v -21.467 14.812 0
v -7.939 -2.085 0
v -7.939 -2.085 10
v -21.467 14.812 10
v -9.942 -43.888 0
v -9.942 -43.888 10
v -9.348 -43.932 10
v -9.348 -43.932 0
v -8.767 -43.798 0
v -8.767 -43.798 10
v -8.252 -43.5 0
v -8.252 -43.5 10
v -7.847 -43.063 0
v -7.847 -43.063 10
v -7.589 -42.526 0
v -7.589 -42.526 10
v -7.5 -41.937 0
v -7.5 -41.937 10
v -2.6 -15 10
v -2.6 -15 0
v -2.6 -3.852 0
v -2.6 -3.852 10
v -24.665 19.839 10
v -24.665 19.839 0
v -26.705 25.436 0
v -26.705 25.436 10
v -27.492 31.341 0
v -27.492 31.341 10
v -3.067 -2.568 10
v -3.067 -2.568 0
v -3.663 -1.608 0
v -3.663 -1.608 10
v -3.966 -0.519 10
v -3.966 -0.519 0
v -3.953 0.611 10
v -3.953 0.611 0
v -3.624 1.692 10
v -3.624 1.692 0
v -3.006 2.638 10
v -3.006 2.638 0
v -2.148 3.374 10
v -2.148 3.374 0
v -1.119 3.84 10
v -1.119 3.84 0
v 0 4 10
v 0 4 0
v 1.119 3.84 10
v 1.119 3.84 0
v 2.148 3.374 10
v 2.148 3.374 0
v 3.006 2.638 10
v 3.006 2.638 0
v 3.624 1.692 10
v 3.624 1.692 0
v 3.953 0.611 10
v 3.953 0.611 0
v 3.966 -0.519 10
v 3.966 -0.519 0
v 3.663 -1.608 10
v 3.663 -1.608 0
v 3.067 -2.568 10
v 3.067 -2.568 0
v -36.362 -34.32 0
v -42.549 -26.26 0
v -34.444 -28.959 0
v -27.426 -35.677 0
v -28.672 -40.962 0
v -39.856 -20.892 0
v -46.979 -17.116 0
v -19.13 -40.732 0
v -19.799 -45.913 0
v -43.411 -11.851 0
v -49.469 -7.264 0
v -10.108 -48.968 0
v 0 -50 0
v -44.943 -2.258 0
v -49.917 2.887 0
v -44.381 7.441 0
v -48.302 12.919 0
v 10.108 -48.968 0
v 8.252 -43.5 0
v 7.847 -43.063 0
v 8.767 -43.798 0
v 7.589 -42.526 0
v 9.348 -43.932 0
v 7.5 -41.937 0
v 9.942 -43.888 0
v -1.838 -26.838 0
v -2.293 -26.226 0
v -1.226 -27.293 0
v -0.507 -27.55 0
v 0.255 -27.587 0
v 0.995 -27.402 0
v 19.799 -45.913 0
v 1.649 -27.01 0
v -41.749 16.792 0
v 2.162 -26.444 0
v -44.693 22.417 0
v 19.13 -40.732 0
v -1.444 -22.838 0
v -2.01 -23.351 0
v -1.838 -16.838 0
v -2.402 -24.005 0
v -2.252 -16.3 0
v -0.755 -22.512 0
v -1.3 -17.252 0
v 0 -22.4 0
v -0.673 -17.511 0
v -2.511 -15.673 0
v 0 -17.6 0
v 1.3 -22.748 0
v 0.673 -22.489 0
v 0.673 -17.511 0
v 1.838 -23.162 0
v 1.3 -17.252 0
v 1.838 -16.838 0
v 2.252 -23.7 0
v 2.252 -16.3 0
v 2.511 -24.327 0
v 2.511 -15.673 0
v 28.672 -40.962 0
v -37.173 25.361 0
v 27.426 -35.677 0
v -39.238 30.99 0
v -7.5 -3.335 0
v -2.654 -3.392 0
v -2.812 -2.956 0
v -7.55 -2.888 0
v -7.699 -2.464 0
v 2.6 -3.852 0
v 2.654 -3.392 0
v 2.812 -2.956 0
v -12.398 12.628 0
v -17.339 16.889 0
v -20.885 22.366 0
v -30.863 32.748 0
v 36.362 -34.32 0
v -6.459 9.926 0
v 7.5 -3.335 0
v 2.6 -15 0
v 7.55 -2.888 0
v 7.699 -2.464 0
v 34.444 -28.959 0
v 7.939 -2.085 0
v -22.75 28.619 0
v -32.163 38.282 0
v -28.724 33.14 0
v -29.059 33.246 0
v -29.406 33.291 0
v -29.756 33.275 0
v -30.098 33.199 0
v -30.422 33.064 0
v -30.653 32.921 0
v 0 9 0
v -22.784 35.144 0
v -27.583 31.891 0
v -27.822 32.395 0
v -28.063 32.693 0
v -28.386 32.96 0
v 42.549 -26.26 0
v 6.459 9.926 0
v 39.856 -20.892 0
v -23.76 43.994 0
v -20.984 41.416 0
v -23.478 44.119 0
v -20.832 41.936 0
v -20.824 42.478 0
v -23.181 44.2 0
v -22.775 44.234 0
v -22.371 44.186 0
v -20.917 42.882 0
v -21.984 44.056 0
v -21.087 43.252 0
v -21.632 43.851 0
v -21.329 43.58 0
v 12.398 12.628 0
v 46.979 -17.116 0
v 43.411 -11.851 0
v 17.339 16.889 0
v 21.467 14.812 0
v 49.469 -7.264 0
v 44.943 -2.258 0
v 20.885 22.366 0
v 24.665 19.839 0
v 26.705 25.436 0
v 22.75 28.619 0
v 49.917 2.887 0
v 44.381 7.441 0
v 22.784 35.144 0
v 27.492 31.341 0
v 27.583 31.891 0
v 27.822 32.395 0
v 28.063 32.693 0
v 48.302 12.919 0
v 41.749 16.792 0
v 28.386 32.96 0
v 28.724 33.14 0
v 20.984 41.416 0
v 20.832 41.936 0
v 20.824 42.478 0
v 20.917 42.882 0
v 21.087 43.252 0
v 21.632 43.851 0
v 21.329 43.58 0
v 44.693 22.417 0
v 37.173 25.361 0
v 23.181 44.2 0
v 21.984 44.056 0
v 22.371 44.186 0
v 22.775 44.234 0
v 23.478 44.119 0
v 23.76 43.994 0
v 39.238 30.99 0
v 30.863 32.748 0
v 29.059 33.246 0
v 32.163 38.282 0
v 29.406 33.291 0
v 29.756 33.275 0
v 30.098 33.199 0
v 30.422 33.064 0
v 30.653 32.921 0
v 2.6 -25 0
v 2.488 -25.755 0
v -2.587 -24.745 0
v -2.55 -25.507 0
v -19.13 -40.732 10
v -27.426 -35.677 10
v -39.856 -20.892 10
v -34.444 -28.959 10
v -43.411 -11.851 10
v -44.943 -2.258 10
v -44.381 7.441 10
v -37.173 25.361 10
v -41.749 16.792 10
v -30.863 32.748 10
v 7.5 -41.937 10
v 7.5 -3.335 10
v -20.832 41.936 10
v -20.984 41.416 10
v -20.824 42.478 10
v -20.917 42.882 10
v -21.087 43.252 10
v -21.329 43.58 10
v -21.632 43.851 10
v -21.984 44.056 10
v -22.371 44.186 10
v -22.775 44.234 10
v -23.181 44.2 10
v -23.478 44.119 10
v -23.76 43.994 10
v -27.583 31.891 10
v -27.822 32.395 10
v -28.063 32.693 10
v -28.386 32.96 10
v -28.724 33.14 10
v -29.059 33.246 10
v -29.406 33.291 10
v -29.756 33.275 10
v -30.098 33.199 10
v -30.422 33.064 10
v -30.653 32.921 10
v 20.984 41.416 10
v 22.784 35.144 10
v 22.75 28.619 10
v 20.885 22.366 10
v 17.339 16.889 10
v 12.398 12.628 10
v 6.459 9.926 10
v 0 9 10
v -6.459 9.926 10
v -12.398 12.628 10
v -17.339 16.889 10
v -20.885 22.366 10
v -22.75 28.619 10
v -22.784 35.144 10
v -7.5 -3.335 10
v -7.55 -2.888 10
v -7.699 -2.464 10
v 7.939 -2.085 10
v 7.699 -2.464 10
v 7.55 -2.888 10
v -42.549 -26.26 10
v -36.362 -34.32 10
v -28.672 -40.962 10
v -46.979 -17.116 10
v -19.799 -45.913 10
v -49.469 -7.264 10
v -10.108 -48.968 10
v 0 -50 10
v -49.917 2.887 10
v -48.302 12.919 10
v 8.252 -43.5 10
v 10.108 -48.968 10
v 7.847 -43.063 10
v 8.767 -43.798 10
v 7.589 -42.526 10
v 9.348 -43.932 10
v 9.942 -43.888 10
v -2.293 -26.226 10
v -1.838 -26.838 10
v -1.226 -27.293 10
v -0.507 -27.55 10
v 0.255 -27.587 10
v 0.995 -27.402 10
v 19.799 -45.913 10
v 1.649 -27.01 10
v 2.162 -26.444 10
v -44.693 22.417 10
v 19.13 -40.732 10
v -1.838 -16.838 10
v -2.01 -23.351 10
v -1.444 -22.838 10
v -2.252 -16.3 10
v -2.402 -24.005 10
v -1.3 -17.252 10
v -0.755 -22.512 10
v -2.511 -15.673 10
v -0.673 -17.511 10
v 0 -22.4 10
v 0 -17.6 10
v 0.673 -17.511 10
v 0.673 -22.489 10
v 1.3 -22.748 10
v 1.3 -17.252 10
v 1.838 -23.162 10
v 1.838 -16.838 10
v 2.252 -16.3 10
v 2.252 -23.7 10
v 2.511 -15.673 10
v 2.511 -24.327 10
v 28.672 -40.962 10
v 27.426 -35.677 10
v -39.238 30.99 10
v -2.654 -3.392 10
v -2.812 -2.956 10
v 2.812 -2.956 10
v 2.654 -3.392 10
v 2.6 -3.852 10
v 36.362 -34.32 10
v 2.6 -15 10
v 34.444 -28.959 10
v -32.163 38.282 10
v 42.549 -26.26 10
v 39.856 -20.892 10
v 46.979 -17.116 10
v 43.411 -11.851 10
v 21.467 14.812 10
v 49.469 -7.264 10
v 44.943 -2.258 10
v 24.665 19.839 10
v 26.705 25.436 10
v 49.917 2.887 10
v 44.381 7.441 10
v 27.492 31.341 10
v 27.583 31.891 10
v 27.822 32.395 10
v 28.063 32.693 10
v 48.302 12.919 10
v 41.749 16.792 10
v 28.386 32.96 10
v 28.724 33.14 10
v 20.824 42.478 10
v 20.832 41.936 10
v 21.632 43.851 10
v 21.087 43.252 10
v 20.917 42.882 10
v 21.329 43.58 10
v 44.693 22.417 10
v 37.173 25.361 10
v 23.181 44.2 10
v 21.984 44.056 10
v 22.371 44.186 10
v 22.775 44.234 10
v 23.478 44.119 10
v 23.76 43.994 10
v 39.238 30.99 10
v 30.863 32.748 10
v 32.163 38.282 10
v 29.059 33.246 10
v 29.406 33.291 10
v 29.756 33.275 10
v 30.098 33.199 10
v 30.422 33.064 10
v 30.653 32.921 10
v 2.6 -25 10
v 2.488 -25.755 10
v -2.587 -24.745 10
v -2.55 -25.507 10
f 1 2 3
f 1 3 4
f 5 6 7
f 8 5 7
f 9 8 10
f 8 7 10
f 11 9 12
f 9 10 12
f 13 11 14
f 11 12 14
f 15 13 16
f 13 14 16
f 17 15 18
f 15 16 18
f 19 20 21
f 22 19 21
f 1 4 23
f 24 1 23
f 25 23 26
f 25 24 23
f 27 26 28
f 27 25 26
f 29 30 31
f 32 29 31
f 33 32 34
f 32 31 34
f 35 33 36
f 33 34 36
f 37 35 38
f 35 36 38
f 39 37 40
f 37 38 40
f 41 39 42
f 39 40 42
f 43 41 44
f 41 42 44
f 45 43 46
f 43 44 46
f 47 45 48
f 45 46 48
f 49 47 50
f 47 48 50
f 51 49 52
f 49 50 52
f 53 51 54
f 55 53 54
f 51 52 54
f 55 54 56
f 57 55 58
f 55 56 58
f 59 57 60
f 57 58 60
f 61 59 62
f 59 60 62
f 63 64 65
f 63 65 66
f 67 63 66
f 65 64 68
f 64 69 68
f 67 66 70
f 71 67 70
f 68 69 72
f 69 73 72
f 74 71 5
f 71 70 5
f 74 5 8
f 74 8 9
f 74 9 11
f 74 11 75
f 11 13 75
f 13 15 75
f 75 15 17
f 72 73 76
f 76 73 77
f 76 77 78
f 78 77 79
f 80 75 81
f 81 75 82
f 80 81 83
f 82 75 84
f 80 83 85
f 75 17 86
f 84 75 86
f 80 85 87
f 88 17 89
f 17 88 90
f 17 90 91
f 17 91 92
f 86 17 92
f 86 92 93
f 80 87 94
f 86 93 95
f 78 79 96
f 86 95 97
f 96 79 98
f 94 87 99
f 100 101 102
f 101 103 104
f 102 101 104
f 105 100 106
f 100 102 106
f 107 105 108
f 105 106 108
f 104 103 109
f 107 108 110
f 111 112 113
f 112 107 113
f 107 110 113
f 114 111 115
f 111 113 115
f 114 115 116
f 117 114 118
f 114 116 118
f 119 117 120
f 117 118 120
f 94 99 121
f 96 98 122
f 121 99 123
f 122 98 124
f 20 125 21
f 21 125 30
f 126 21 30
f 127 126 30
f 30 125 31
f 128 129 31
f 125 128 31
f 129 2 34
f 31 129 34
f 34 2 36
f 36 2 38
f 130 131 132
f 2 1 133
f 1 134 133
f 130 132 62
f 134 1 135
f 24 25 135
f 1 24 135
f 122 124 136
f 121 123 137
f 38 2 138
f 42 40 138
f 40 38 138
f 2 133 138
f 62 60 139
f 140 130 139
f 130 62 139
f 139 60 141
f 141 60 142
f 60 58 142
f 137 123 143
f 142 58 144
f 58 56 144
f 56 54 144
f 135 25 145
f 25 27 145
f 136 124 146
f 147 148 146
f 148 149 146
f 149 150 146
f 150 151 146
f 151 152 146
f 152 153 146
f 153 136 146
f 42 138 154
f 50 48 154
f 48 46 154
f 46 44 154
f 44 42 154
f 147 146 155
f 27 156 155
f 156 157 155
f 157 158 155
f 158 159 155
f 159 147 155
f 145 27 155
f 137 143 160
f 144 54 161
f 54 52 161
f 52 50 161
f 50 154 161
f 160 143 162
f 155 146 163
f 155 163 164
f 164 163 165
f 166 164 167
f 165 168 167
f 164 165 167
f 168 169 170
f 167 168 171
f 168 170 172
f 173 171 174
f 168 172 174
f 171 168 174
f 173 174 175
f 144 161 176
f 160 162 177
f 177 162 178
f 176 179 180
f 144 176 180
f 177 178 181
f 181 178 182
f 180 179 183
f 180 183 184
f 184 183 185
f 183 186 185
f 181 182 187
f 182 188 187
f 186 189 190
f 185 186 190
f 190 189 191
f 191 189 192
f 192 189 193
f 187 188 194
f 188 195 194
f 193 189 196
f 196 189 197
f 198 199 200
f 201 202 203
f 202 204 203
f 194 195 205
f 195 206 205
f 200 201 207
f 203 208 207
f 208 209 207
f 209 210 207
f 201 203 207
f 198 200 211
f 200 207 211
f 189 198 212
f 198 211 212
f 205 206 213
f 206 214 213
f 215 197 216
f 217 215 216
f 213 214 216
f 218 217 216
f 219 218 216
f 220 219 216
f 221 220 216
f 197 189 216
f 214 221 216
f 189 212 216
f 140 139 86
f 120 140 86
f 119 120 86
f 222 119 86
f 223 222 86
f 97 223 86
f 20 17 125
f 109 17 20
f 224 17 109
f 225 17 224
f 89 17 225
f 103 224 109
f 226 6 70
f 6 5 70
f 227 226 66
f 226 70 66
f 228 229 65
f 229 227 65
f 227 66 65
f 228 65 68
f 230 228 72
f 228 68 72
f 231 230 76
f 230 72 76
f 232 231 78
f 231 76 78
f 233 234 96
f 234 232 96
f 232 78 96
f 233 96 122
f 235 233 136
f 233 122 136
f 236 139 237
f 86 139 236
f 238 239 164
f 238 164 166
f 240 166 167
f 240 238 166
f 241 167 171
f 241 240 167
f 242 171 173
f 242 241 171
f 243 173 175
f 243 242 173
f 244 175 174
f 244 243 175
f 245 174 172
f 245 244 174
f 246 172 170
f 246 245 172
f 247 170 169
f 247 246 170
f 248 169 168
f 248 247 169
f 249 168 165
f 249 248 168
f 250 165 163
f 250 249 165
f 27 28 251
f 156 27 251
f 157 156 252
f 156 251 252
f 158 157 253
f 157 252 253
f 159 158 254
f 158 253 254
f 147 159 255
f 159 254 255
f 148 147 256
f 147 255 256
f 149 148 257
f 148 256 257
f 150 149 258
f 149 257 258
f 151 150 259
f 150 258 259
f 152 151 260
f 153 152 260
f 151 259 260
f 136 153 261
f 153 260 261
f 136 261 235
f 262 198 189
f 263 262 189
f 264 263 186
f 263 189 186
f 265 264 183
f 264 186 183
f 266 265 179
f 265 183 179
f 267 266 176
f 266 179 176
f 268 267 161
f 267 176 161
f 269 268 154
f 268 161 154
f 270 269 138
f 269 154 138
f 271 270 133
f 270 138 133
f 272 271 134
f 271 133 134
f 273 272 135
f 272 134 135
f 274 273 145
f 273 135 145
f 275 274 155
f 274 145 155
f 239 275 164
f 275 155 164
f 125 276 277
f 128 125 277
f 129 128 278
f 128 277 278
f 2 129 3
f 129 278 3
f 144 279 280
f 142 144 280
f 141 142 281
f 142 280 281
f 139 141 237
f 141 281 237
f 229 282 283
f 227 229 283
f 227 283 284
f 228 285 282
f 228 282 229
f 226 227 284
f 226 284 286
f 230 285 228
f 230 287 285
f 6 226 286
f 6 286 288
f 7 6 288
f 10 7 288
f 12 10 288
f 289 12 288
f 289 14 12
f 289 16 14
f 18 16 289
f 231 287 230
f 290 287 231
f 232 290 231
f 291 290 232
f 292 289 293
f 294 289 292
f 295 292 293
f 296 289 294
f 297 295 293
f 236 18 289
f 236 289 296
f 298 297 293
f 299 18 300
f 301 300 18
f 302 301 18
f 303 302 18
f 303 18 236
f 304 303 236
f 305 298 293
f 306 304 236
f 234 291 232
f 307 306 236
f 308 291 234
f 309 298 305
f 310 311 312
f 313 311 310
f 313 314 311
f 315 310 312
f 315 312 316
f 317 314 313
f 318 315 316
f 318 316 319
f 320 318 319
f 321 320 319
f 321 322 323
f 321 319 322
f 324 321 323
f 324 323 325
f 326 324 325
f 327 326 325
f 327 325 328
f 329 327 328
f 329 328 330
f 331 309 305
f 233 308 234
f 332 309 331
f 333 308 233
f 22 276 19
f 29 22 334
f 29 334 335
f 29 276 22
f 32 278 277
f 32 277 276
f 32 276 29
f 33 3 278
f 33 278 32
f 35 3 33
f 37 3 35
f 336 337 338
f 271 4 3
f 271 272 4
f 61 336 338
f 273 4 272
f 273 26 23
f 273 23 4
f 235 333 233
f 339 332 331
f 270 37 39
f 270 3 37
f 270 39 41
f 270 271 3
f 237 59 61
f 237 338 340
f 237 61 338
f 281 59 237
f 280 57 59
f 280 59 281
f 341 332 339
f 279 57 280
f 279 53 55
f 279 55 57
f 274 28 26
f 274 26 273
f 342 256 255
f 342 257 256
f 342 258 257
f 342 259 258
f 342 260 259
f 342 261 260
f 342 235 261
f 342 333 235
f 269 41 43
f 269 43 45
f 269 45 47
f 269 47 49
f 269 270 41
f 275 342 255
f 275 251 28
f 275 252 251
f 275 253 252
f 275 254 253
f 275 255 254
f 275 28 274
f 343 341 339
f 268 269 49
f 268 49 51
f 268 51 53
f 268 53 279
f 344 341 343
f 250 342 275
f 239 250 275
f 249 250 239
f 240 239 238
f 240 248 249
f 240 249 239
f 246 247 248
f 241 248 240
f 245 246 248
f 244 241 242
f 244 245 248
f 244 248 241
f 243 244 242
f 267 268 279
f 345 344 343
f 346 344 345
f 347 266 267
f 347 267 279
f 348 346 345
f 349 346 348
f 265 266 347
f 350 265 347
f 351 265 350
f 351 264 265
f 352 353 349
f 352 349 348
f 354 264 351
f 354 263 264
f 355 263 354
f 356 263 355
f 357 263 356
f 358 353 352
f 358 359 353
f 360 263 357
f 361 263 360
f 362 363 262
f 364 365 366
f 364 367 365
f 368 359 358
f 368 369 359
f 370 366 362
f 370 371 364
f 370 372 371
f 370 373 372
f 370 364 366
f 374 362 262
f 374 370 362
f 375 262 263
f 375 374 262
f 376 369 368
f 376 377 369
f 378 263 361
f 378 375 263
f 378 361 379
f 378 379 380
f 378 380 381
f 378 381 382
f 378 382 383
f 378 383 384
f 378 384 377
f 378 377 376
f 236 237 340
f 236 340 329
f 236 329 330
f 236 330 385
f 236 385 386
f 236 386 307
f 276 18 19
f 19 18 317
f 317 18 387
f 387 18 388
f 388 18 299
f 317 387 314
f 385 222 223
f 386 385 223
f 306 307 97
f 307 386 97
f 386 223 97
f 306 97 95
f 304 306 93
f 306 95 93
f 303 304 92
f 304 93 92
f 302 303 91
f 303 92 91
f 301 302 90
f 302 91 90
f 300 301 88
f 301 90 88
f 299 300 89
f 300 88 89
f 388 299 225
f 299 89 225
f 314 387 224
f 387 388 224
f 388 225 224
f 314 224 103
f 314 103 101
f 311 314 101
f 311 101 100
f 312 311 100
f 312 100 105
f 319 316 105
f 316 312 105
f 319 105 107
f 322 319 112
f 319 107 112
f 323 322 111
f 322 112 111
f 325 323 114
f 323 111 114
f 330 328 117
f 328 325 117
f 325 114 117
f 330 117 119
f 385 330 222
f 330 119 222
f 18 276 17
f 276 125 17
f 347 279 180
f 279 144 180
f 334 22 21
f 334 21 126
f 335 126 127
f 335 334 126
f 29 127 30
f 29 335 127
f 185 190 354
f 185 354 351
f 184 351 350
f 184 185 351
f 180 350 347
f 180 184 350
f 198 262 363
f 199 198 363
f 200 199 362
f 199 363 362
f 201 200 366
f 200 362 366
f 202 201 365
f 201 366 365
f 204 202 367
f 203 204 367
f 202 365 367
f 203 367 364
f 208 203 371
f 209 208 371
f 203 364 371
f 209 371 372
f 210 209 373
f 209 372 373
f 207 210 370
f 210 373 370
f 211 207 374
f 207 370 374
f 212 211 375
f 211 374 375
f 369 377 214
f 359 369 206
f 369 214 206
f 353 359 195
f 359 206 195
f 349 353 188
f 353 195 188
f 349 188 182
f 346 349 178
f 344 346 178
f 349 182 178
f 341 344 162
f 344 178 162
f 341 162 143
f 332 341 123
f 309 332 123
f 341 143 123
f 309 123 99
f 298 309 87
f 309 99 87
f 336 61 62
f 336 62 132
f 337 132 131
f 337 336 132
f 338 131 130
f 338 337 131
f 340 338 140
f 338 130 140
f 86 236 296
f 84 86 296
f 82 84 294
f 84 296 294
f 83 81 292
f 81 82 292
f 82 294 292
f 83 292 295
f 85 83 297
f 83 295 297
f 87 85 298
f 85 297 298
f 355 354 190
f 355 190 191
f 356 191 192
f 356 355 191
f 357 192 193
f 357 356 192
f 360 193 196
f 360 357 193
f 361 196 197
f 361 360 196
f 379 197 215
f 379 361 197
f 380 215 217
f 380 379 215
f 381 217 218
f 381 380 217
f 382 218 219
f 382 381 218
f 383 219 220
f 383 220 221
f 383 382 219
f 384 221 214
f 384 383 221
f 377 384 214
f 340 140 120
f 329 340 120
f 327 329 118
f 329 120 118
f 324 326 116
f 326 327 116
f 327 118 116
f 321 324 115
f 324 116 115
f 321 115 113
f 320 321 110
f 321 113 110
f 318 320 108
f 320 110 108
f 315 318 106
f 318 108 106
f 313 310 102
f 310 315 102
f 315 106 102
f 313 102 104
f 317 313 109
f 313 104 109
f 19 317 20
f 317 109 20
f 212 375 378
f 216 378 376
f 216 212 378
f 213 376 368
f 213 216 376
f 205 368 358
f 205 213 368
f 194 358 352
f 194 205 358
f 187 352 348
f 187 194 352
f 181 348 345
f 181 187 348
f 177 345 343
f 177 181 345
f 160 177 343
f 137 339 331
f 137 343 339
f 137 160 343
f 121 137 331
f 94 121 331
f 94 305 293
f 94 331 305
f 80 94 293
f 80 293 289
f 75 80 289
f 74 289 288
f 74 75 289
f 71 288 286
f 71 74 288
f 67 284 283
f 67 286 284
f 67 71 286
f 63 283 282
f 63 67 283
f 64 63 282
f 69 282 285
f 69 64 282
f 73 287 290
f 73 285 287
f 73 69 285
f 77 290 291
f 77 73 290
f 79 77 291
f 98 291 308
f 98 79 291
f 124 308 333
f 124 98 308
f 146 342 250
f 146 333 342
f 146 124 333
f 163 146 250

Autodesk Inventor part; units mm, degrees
ref_plane "YZ Plane" through (0, 0, 0) normal (1, 0, 0) x (0, 1, 0)
ref_plane "XZ Plane" through (0, 0, 0) normal (0, 1, 0) x (-1, 0, 0)
ref_plane "XY Plane" through (0, 0, 0) normal (0, 0, 1) x (1, 0, 0)
sketch "Sketch1" plane through (0, 0, 0) normal (0, 0, 1) x (1, 0, 0)
  circle A0 centre (0, 0) radius 60.5521
  arc A1 (-0.7258, 10.3355) -> (0.2666, 10.325) centre (0, 32) ccw
  circle A2 centre (0, 0) radius 60.5521
  circle A3 centre (0, 32) radius 2.5
  circle A4 centre (0, 0) radius 50
  circle A5 centre (0, 0) radius 57.5
  circle A6 centre (0, 0) radius 57
  circle A7 centre (0, 0) radius 7.5
  circle A8 centre (0, 32) radius 23
  circle A9 centre (0, 0) radius 45
  circle A10 centre (0, 32) radius 27.5
  line L0 (-5.8547, -4.6875) -> (-21.4672, 14.8125)
  line L1 (5.8547, -4.6875) -> (21.4672, 14.8125)
  line L2 (0, 0) -> (0, 32)
  line L3 (7.5, 44.3706) -> (7.5, -44.3706)
  line L4 (-7.5, 44.3706) -> (-7.5, -44.3706)
  circle A11 centre (0, 0) radius 2.6
  line L5 (0, 0) -> (0, -15)
  circle A12 centre (0, -15) radius 2.6
  line L6 (-2.6, -15) -> (-2.6, 0)
  line L7 (2.6, 0) -> (2.6, -15)
  circle A13 centre (0, 0) radius 4
  line L8 (0, -15) -> (0, -25)
  circle A14 centre (0, -25) radius 2.6
  point P0 (27.2328, 35.8242)
  point P1 (7.5, -2.6325)
  point P2 (-27.2328, 35.8242)
  point P3 (-7.5, -2.6325)
  point P4 (17.6083, 46.7969)
  point P5 (-17.6083, 46.7969)
  point P6 (-2.6, -3.0397)
  point P7 (2.6, -3.0397)
  dimension "d0" = 5
  dimension "d1" = 100
  dimension "d2" = 115
  dimension "d4" = 15
  dimension "d5" = 46
  dimension "d6" = 90
  dimension "d7" = 55
  dimension "d8" = 32
  dimension "d12" = 5.2
  dimension "d13" = 15
  dimension "d14" = 5.2
  dimension "d15" = 8
  dimension "d17" = 10
  dimension "d18" = 5.2
extrude "Extrusion1" add sketch "Sketch1" along normal blind 10 contours A8 L3 A10 A7 L2 | L2 A7 A10 L4 A8 | L4 A10 A9 A8 | A8 A9 A10 L3 | L2 A10 A7 | A7 A10 L2 | A9 A10 A4 A8 | L4 L0 A10 | A10 A7 L4 | L3 A7 A10 | A10 L1 L3 | A7 L7 A13 L2 A10 | A10 L2 A13 L6 A7 | A9 A10 A4 | A7 L0 L4 | A8 A4 A10 A9 | L3 L1 A7 | L4 L0 A7 L6 A12 L7 L1 L3 A9
fillet "Fillet1" radius 2 8 edges at (-17.6083, 46.7969, 5) (17.6083, 46.7969, 5) (27.2328, 35.8242, 5) (-27.2328, 35.8242, 5) (-7.5, -2.6325, 5) (7.5, -2.6325, 5) (7.5, -44.3706, 5) (-7.5, -44.3706, 5)
fillet "Fillet2" radius 2 2 edges at (-2.6, -3.0397, 5) (2.6, -3.0397, 5)
properties part number "Gear Holder 1"
